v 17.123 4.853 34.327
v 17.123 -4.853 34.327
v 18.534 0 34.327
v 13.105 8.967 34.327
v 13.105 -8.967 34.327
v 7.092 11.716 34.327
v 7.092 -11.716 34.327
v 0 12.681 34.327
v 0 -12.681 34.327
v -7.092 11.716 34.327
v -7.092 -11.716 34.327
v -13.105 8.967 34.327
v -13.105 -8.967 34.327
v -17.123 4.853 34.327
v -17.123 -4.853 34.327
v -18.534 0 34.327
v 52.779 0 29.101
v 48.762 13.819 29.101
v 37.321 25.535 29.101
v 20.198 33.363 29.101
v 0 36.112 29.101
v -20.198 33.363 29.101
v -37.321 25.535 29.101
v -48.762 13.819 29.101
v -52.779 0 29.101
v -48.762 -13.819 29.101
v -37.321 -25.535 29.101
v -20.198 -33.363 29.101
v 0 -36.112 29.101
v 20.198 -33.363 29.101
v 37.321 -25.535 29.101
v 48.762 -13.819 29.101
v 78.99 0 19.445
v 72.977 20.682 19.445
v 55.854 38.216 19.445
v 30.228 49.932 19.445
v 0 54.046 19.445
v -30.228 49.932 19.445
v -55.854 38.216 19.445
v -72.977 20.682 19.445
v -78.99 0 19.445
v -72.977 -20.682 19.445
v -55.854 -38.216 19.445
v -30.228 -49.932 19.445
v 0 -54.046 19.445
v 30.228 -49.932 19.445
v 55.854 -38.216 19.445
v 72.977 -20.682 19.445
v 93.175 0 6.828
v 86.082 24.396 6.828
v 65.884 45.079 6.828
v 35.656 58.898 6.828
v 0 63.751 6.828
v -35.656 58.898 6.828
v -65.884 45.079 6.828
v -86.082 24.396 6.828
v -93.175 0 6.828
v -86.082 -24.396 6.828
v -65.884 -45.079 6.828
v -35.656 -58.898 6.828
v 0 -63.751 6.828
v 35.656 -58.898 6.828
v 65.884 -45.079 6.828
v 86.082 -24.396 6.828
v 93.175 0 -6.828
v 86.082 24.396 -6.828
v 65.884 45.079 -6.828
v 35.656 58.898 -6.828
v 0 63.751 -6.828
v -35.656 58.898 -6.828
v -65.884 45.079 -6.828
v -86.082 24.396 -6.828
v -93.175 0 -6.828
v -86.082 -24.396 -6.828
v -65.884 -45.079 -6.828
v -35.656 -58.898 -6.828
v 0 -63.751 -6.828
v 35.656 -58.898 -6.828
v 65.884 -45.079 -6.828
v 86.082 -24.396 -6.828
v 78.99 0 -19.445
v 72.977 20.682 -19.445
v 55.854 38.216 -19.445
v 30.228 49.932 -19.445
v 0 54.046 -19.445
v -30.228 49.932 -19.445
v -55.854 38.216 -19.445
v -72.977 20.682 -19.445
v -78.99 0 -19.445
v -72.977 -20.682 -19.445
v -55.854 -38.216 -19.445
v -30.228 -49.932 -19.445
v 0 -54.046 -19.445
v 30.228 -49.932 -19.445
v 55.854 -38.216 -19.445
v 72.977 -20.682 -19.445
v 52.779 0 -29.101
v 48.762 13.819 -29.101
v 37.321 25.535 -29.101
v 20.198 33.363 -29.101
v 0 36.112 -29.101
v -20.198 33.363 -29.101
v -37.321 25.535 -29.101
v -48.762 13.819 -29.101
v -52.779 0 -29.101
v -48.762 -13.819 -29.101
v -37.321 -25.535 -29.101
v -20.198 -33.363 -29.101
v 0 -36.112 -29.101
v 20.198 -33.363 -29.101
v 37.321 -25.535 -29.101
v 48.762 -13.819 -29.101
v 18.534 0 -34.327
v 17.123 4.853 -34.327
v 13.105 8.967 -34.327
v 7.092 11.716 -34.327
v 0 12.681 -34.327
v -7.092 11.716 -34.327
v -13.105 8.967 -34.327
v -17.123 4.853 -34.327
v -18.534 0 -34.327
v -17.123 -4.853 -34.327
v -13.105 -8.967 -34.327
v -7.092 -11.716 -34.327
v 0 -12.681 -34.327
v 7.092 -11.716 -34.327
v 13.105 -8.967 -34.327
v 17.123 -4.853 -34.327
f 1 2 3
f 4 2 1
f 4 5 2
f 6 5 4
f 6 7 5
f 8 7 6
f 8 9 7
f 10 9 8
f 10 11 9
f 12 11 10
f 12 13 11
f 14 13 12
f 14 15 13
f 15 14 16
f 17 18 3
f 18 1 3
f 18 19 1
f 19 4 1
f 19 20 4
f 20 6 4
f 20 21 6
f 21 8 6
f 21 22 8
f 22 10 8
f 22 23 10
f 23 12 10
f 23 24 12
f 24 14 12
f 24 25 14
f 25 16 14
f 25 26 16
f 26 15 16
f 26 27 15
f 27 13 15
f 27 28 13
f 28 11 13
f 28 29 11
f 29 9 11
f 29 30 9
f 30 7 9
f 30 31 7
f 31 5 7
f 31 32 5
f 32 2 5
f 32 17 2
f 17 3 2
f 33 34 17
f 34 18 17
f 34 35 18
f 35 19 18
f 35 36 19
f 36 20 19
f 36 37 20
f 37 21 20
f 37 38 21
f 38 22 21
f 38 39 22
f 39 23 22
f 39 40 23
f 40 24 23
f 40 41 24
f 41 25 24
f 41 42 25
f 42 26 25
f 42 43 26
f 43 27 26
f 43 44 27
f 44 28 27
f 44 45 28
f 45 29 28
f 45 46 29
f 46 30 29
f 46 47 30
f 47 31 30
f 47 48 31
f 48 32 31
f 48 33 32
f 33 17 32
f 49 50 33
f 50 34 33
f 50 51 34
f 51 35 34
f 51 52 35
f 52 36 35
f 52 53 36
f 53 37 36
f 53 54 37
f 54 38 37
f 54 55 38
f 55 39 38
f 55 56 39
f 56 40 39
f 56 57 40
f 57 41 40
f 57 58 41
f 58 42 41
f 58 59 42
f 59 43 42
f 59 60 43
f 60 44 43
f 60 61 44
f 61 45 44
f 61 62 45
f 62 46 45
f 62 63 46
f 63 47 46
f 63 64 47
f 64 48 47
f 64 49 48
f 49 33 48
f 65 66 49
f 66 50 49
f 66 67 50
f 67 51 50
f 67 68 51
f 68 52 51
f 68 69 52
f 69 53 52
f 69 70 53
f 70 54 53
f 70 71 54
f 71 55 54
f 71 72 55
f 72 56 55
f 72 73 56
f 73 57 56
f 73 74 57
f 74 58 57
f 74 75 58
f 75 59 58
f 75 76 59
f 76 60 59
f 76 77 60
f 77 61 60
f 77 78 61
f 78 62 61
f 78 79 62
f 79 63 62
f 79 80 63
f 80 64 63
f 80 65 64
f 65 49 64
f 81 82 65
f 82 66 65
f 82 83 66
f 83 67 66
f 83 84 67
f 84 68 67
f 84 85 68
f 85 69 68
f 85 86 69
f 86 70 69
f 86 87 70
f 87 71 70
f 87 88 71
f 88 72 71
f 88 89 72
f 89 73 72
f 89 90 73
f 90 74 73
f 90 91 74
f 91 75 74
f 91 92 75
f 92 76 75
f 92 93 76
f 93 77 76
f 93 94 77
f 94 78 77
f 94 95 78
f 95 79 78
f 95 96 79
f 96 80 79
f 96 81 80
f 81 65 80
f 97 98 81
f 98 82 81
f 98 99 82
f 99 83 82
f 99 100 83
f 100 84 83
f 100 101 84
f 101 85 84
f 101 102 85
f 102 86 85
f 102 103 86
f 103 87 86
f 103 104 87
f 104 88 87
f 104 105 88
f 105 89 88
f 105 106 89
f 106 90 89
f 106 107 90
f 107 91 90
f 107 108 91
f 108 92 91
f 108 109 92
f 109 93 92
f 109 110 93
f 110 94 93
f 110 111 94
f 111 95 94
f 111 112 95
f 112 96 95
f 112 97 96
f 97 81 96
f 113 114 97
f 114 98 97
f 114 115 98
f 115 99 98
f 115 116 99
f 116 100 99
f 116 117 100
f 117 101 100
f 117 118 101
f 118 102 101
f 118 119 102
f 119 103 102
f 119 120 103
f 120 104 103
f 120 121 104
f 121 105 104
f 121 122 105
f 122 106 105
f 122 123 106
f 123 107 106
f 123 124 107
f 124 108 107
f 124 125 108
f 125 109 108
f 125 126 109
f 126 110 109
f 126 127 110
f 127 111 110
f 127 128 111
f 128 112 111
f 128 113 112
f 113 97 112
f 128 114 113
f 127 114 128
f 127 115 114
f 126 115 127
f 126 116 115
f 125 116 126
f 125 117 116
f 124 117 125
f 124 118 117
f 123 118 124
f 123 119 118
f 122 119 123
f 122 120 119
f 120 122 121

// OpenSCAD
// Generated by SolidPython 1.0.1 on 2020-07-29 00:46:54


scale(v = [19, 13, 7]) {
	sphere(r = 5);
}
/***********************************************
*********      SolidPython code:      **********
************************************************
 
# import packages: SolidPython
from solid import *
from solid.utils import *
from itertools import chain, combinations, permutations


class Resize:

    def __init__(self, scad_file):
        self.scad_file = scad_file
        #self.scad_file = import_scad(scad_file)
        # cone/cylinder param:
        self.r1 = 0
        self.r2 = 0
        self.h = 0
        # rectangular prism param:
        self.w = 0
        self.l = 0
        # ellipse param:
        self.r = 0

    # import OpenScad code (file name corresponds to shape)


    # classify shape + parameters
    def assign(self, param1, param2, param3):
        if self.scad_file == 'cone.scad':
            self.r1 = param1
            self.r2 = param2
            self.h = param3
        elif self.scad_file == 'cylinder.scad':
            self.r1 = param1
            self.r2 = param2
            self.h = param3
        elif self.scad_file == 'rectangularPrism.scad':
            self.h = param1
            self.l = param2
            self.w = param3
        else:
            self.r = param1
            self.h = param2

    # resize parameters
    def iterate(self):
        x = range(3, 20, 2)
        i = 1
        if self.scad_file == 'cone.scad':
            tempList = list(permutations(x, 2))
            for temp in tempList:
                param1 = temp[0]
                param2 = temp[1]
                filepath = 'produced_scad_files/' + 'cone' + str(param1) + '_' + str(param2) + '_' + '.scad'
                scad_render_to_file(cylinder(h=param1, r1=param2, r2=0), filepath)

        elif self.scad_file == 'cylinder.scad':
            tempList = list(permutations(x, 3))
            for temp in tempList:
                param1 = temp[0]
                param2 = temp[1]
                filepath = 'produced_scad_files/' + 'cylinder' + str(param1) + '_' + str(param2) + '_' + '.scad'
                scad_render_to_file(cylinder(h=param1, r1=param2, r2=param2), filepath)

        elif self.scad_file == 'rectangularPrism.scad':
            tempList = list(permutations(x, 3))
            for temp in tempList:
                param1 = temp[0]
                param2 = temp[1]
                param3 = temp[2]
                filepath = 'produced_scad_files/' + 'rectangularPrism' + str(param1) + '_' + str(param2) + '_' + str(
                    param3) + '.scad'
                scad_render_to_file(cube(size=(param1, param2, param3)), filepath)

        elif self.scad_file == 'ellipse.scad':
            tempList = list(permutations(x, 4))
            for temp in tempList:
                param1 = temp[0]
                param2 = temp[1]
                param3 = temp[2]
                param4 = temp[3]
                filepath = 'produced_scad_files/' + 'ellipse' + str(param1) + '_' + str(param2) + '_' + str(param3) + '_' + str(param4) + '.scad'
                scad_render_to_file(scale([param1, param2, param3])(sphere(r=param4)), filepath)

    def render_to_scadfile(self):
        scad_render_to_file(scad, 'example.scad') 
 
************************************************/
